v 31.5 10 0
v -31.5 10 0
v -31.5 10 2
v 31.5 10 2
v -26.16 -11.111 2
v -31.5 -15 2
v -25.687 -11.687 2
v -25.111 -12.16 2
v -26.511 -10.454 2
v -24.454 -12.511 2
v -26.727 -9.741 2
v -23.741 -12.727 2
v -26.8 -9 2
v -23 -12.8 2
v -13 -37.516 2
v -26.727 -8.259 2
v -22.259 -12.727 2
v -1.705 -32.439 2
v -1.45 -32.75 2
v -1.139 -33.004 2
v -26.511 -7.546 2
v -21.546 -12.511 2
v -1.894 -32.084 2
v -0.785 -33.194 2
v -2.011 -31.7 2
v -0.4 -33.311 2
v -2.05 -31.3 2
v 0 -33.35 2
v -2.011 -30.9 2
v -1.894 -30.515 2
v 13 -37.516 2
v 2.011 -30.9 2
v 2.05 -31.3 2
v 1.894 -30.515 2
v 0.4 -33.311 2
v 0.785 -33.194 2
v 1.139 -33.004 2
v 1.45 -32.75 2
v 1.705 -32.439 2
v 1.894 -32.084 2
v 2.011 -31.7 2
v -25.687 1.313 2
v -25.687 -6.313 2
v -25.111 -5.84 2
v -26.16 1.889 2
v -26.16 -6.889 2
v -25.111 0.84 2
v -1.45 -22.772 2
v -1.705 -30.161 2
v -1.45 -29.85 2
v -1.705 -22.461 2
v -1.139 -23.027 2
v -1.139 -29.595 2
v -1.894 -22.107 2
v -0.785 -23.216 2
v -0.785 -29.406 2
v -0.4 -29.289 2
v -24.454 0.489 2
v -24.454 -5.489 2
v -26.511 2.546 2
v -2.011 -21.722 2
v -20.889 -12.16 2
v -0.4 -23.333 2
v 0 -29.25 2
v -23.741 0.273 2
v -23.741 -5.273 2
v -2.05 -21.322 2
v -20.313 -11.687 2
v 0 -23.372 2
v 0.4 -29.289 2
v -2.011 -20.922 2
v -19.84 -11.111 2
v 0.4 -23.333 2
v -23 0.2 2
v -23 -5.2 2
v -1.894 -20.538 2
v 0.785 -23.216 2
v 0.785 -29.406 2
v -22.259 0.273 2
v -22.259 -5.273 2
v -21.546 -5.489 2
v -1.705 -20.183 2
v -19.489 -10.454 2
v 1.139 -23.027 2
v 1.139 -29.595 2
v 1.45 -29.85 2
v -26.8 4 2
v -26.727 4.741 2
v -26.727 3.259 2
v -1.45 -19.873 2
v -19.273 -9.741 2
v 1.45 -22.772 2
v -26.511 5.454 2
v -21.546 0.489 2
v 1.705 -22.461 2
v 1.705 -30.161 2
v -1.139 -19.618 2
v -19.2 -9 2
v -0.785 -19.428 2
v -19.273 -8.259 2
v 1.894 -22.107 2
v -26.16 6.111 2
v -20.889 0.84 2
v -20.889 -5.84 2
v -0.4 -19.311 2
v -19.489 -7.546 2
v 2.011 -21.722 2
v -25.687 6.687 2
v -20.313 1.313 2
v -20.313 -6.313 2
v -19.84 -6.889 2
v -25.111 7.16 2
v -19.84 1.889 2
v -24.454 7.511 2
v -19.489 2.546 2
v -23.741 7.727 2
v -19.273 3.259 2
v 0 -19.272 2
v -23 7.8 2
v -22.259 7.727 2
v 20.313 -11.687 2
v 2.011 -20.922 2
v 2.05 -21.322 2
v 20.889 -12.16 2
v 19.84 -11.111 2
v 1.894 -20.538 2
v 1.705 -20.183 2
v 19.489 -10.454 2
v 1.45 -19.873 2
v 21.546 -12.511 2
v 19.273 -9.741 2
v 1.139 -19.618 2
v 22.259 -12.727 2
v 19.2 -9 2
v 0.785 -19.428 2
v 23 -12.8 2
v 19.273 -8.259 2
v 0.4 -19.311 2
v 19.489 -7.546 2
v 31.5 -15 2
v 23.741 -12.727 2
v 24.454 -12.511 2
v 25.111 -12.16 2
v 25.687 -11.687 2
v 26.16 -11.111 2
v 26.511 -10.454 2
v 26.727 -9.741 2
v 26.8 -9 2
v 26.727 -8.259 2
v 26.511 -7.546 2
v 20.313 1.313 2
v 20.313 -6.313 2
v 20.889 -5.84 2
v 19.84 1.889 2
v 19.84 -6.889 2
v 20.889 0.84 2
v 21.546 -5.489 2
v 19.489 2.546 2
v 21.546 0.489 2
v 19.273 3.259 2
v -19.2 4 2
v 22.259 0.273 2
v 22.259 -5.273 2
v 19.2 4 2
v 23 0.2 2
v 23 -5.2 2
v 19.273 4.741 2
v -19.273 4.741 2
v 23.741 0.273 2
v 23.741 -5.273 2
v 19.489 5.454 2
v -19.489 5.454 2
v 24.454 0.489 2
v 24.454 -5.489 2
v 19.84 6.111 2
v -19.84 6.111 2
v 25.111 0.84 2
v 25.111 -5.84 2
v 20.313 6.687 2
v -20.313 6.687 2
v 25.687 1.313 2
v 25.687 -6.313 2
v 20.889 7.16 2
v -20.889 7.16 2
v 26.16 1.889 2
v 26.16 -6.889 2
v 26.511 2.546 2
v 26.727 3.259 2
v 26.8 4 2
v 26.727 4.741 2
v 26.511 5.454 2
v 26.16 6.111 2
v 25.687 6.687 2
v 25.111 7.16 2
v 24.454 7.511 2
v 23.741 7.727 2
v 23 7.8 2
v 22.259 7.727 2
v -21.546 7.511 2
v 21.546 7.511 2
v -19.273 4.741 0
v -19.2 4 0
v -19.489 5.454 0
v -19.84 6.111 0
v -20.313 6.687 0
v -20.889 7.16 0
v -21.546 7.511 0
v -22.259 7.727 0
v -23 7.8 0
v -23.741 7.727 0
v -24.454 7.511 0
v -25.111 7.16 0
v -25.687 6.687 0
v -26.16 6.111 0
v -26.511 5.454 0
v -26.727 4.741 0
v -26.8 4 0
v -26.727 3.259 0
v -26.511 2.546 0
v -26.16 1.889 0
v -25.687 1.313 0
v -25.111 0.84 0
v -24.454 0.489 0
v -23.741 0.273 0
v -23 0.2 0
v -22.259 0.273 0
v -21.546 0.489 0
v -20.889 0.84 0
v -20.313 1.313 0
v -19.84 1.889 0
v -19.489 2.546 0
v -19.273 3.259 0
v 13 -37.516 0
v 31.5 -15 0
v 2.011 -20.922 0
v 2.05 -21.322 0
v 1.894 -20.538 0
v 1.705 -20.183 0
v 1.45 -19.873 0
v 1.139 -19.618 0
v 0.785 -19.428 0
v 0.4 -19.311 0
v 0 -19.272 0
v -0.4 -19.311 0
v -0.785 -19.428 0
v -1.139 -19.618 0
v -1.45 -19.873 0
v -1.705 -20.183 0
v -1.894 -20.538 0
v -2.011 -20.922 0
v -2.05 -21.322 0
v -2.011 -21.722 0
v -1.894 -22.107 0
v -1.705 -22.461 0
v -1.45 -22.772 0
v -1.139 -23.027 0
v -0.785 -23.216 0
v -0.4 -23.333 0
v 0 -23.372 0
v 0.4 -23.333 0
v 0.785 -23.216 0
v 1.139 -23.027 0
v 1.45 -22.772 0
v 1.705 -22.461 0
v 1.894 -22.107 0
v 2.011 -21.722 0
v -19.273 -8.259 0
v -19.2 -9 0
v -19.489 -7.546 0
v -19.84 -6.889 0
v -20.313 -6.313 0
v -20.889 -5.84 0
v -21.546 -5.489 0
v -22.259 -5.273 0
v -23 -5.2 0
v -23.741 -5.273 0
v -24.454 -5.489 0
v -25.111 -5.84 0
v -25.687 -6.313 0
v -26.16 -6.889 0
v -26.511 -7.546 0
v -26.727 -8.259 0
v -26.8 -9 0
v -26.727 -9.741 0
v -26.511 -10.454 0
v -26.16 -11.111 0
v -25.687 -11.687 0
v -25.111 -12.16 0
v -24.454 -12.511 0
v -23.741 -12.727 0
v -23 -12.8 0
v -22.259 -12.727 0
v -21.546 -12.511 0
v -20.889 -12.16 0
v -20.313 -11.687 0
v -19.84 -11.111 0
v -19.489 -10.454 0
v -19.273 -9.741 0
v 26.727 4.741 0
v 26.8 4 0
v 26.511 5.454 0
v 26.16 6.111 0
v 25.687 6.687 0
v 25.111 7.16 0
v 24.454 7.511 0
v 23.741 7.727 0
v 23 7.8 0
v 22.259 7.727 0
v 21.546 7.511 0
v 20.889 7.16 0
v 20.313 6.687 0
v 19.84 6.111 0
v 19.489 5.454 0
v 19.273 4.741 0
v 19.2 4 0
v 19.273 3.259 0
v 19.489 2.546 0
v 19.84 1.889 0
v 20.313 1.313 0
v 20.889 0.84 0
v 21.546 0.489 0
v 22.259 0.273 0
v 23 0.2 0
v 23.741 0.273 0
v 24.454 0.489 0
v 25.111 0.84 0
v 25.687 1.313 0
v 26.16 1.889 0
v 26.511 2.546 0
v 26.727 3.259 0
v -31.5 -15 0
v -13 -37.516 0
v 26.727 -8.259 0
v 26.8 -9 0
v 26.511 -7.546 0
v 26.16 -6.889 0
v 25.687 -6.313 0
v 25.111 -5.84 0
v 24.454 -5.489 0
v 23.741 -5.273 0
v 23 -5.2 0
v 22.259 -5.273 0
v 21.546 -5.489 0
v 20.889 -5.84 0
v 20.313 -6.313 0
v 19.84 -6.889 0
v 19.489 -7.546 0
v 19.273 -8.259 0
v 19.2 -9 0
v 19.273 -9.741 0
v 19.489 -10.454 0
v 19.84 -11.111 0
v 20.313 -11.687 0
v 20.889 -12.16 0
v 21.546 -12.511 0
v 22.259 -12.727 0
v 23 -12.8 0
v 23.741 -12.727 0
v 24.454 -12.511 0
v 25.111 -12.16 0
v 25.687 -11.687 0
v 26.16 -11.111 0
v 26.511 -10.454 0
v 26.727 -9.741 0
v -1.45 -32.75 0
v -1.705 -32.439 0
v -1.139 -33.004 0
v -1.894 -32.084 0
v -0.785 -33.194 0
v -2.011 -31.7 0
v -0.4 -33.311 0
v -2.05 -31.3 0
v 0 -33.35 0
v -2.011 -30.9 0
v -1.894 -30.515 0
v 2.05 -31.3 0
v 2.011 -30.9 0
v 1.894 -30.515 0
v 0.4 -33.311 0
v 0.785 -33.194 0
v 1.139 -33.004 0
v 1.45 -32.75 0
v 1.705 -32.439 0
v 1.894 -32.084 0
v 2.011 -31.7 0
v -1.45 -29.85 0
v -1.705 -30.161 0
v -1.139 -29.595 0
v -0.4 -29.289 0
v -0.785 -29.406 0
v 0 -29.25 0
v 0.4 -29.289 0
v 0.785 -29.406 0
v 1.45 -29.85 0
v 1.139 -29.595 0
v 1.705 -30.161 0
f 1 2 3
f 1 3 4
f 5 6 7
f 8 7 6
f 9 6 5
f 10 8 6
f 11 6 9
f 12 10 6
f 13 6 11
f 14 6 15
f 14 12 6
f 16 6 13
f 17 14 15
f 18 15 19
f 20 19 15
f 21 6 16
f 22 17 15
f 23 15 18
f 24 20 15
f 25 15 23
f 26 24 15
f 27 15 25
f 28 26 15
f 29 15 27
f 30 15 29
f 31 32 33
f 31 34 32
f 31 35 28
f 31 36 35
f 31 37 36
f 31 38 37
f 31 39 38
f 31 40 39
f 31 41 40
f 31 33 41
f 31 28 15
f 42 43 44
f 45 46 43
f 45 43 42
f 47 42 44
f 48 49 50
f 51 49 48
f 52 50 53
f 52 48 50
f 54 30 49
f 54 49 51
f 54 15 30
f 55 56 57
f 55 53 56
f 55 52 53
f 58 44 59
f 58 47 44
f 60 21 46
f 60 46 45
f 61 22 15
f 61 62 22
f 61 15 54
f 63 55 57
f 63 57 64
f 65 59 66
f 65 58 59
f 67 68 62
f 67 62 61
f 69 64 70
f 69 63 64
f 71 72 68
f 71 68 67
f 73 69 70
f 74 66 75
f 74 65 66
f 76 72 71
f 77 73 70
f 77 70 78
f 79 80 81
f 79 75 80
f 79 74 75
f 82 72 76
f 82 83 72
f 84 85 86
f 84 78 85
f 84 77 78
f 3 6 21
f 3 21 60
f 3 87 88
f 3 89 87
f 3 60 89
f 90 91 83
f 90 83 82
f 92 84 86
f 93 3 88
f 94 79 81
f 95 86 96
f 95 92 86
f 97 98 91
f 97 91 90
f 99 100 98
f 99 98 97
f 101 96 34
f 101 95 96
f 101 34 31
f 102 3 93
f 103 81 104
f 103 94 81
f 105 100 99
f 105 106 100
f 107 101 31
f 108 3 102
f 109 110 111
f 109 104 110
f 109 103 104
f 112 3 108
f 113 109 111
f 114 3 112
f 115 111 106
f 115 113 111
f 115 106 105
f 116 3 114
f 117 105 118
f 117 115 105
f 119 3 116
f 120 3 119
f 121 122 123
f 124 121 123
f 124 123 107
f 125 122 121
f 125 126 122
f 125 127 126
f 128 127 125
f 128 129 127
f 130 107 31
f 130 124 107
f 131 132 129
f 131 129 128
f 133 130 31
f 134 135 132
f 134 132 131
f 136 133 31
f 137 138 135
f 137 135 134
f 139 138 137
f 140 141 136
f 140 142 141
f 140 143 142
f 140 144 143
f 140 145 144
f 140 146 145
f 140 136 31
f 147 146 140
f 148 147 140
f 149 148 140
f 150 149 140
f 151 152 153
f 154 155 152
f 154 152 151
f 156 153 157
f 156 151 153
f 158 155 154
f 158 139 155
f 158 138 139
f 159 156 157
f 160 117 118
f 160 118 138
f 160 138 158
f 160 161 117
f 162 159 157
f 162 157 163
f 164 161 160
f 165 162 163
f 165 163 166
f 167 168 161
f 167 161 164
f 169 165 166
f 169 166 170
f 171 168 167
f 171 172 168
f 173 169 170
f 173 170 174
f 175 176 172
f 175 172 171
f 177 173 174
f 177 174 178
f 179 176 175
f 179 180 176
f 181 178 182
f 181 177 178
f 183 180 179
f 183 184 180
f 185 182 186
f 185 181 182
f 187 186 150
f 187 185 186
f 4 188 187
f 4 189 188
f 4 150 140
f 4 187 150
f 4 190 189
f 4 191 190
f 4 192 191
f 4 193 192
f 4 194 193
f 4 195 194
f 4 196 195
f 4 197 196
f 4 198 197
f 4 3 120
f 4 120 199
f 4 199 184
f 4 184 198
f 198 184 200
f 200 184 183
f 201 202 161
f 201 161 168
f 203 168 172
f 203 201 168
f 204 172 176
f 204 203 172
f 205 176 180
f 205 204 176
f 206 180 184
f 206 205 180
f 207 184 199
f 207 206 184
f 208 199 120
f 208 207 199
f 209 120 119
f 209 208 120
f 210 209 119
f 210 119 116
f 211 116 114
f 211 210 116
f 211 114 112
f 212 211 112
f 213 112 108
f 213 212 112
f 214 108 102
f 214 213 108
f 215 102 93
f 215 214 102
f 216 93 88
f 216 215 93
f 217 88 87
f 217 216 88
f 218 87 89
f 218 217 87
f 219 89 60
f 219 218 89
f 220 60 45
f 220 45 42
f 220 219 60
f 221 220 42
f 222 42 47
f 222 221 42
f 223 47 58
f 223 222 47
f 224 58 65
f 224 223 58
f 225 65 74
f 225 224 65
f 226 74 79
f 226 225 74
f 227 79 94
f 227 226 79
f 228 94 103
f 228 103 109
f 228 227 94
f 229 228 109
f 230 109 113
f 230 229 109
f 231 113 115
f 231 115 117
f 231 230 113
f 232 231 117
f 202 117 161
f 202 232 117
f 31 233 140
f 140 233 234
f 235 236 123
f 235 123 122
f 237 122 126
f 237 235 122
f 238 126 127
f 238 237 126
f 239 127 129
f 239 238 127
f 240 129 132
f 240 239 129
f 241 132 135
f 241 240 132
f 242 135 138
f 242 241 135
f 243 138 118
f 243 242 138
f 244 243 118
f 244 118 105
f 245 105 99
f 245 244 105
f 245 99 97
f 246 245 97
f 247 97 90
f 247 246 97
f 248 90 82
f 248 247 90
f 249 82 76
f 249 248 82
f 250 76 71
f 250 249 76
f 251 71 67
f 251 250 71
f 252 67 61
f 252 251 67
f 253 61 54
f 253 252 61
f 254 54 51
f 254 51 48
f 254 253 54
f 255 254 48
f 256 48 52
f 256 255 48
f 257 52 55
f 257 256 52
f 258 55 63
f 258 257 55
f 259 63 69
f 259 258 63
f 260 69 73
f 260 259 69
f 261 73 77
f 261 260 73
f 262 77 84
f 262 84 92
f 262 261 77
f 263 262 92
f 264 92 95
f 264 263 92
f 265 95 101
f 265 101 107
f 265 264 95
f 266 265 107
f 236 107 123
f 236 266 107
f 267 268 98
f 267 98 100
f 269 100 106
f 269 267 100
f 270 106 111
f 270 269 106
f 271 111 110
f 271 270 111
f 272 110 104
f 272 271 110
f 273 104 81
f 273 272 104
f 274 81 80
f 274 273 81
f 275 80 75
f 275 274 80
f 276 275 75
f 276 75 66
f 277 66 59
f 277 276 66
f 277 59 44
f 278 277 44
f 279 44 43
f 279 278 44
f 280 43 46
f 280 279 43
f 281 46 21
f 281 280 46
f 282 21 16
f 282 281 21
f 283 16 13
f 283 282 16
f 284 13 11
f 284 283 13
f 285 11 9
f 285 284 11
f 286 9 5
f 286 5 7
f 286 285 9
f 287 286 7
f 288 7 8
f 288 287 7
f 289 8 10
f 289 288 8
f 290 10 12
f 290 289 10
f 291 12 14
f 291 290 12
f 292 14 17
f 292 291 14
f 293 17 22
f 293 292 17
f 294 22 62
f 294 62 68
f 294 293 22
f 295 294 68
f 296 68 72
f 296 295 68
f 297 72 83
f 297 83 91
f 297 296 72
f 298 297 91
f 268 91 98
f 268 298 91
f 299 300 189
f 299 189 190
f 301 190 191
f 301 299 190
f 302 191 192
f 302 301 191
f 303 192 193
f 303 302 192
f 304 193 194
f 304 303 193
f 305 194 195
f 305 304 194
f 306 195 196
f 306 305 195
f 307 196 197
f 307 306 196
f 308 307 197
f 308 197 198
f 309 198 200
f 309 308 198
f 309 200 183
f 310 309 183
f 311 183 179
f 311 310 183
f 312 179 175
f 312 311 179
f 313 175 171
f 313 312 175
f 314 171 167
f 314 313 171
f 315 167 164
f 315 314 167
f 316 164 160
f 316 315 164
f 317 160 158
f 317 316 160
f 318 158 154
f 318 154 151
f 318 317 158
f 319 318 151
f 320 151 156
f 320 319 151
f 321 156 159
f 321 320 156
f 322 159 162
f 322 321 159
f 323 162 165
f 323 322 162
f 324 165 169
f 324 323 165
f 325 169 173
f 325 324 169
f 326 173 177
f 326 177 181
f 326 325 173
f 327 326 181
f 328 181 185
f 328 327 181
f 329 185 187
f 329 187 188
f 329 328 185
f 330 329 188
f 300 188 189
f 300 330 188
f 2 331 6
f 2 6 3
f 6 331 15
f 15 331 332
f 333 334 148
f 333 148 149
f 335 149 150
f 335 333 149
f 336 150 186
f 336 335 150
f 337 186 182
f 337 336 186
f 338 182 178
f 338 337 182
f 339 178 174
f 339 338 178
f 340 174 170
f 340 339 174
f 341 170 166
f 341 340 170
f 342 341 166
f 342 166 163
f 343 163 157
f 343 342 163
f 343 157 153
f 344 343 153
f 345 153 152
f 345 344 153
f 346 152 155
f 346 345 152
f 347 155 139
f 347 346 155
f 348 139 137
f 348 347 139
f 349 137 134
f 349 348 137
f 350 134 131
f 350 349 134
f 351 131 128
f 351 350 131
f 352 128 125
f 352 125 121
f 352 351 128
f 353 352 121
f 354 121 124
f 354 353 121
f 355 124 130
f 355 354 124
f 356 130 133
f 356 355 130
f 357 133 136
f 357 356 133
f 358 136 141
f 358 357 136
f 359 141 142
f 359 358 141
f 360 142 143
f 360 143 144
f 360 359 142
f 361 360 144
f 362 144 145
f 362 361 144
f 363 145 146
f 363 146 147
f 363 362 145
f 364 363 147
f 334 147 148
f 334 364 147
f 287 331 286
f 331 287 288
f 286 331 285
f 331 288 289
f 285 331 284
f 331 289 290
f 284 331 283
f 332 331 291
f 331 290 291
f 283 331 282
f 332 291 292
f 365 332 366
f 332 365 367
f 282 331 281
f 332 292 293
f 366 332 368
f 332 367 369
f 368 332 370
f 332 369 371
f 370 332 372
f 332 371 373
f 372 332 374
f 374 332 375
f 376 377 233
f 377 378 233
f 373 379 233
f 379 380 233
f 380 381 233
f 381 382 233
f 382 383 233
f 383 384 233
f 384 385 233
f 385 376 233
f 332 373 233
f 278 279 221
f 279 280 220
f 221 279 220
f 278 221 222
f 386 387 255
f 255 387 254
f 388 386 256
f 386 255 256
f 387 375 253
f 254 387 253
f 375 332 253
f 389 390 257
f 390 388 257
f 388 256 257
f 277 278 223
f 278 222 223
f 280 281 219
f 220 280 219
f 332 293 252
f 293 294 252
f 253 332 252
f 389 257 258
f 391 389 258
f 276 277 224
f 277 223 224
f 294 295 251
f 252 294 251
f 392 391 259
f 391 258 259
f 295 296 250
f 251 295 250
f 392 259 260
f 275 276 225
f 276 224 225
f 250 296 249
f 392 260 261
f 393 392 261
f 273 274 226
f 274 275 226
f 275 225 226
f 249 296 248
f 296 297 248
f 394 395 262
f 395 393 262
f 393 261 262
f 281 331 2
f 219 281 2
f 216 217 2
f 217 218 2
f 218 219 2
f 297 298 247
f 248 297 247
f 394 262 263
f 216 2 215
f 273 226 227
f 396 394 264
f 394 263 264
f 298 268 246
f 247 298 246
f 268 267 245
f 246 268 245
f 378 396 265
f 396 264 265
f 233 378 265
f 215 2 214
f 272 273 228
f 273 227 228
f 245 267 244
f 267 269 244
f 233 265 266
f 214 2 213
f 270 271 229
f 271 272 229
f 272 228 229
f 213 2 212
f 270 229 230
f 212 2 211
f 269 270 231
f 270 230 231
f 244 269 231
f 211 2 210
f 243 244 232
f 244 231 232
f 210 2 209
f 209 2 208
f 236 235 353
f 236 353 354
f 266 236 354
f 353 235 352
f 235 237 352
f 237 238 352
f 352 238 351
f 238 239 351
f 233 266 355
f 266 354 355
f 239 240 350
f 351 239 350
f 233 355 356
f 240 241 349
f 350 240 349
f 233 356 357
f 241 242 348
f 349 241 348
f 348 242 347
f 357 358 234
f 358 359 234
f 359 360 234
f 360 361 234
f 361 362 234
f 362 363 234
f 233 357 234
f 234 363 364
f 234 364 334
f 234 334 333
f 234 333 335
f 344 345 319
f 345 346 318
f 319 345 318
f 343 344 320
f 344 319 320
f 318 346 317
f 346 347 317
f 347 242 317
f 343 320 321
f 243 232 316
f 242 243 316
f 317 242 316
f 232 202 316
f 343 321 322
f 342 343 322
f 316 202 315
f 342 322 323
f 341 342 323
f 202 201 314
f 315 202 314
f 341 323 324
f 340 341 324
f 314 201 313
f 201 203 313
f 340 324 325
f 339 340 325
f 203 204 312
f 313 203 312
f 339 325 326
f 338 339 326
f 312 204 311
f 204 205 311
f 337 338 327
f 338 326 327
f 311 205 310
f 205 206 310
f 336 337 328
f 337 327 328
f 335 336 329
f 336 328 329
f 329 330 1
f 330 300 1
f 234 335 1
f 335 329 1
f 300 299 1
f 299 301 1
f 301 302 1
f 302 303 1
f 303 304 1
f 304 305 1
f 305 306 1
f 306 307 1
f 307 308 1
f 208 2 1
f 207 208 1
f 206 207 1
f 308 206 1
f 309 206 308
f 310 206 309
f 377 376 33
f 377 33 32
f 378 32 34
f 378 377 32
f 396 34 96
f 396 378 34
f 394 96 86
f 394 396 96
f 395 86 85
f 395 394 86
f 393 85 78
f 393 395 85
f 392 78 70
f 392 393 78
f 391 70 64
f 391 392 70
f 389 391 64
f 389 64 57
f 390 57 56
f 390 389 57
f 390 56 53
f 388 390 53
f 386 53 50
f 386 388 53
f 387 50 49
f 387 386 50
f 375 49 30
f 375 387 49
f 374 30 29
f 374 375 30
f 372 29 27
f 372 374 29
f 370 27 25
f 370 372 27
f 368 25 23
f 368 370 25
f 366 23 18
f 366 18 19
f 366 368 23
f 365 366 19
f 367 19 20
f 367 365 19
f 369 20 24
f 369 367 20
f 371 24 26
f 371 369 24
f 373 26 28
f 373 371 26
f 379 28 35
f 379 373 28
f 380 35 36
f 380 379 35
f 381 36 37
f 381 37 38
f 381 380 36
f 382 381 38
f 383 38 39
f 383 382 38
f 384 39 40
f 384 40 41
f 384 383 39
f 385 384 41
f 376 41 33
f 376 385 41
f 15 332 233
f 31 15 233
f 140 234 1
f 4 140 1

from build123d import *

# Parameters (mm, degrees)
SKETCH1_W           = 63
SKETCH1_H           = 25
SKETCH1_R           = 3.8
BOSS_EXTRUDE1_DEPTH = 2
SKETCH1_3_R         = 2.05
BOSS_EXTRUDE2_DEPTH = 2


with BuildPart() as part:
    # Sketch1 → Boss-Extrude1 (new body)
    with BuildSketch(Plane.XY):
        with Locations((0, -2.5)):
            Rectangle(SKETCH1_W, SKETCH1_H)
        with Locations((-23, -9)):
            Circle(SKETCH1_R, mode=Mode.SUBTRACT)
        with Locations((-23, 4)):
            Circle(SKETCH1_R, mode=Mode.SUBTRACT)
        with Locations((23, -9)):
            Circle(SKETCH1_R, mode=Mode.SUBTRACT)
        with Locations((23, 4)):
            Circle(SKETCH1_R, mode=Mode.SUBTRACT)
    extrude(amount=BOSS_EXTRUDE1_DEPTH)

    # Sketch1<3> → Boss-Extrude2 (add)
    with BuildSketch(Plane.XY):
        Polygon((13, -37.51566868), (31.5, -15), (-31.5, -15), (-13, -37.51566868), (0, -37.51566868), align=None)
        with Locations((0, -31.299955557)):
            Circle(SKETCH1_3_R, mode=Mode.SUBTRACT)
        with Locations((0, -21.322069584)):
            Circle(SKETCH1_3_R, mode=Mode.SUBTRACT)
    extrude(amount=BOSS_EXTRUDE2_DEPTH)


solid = part.part
